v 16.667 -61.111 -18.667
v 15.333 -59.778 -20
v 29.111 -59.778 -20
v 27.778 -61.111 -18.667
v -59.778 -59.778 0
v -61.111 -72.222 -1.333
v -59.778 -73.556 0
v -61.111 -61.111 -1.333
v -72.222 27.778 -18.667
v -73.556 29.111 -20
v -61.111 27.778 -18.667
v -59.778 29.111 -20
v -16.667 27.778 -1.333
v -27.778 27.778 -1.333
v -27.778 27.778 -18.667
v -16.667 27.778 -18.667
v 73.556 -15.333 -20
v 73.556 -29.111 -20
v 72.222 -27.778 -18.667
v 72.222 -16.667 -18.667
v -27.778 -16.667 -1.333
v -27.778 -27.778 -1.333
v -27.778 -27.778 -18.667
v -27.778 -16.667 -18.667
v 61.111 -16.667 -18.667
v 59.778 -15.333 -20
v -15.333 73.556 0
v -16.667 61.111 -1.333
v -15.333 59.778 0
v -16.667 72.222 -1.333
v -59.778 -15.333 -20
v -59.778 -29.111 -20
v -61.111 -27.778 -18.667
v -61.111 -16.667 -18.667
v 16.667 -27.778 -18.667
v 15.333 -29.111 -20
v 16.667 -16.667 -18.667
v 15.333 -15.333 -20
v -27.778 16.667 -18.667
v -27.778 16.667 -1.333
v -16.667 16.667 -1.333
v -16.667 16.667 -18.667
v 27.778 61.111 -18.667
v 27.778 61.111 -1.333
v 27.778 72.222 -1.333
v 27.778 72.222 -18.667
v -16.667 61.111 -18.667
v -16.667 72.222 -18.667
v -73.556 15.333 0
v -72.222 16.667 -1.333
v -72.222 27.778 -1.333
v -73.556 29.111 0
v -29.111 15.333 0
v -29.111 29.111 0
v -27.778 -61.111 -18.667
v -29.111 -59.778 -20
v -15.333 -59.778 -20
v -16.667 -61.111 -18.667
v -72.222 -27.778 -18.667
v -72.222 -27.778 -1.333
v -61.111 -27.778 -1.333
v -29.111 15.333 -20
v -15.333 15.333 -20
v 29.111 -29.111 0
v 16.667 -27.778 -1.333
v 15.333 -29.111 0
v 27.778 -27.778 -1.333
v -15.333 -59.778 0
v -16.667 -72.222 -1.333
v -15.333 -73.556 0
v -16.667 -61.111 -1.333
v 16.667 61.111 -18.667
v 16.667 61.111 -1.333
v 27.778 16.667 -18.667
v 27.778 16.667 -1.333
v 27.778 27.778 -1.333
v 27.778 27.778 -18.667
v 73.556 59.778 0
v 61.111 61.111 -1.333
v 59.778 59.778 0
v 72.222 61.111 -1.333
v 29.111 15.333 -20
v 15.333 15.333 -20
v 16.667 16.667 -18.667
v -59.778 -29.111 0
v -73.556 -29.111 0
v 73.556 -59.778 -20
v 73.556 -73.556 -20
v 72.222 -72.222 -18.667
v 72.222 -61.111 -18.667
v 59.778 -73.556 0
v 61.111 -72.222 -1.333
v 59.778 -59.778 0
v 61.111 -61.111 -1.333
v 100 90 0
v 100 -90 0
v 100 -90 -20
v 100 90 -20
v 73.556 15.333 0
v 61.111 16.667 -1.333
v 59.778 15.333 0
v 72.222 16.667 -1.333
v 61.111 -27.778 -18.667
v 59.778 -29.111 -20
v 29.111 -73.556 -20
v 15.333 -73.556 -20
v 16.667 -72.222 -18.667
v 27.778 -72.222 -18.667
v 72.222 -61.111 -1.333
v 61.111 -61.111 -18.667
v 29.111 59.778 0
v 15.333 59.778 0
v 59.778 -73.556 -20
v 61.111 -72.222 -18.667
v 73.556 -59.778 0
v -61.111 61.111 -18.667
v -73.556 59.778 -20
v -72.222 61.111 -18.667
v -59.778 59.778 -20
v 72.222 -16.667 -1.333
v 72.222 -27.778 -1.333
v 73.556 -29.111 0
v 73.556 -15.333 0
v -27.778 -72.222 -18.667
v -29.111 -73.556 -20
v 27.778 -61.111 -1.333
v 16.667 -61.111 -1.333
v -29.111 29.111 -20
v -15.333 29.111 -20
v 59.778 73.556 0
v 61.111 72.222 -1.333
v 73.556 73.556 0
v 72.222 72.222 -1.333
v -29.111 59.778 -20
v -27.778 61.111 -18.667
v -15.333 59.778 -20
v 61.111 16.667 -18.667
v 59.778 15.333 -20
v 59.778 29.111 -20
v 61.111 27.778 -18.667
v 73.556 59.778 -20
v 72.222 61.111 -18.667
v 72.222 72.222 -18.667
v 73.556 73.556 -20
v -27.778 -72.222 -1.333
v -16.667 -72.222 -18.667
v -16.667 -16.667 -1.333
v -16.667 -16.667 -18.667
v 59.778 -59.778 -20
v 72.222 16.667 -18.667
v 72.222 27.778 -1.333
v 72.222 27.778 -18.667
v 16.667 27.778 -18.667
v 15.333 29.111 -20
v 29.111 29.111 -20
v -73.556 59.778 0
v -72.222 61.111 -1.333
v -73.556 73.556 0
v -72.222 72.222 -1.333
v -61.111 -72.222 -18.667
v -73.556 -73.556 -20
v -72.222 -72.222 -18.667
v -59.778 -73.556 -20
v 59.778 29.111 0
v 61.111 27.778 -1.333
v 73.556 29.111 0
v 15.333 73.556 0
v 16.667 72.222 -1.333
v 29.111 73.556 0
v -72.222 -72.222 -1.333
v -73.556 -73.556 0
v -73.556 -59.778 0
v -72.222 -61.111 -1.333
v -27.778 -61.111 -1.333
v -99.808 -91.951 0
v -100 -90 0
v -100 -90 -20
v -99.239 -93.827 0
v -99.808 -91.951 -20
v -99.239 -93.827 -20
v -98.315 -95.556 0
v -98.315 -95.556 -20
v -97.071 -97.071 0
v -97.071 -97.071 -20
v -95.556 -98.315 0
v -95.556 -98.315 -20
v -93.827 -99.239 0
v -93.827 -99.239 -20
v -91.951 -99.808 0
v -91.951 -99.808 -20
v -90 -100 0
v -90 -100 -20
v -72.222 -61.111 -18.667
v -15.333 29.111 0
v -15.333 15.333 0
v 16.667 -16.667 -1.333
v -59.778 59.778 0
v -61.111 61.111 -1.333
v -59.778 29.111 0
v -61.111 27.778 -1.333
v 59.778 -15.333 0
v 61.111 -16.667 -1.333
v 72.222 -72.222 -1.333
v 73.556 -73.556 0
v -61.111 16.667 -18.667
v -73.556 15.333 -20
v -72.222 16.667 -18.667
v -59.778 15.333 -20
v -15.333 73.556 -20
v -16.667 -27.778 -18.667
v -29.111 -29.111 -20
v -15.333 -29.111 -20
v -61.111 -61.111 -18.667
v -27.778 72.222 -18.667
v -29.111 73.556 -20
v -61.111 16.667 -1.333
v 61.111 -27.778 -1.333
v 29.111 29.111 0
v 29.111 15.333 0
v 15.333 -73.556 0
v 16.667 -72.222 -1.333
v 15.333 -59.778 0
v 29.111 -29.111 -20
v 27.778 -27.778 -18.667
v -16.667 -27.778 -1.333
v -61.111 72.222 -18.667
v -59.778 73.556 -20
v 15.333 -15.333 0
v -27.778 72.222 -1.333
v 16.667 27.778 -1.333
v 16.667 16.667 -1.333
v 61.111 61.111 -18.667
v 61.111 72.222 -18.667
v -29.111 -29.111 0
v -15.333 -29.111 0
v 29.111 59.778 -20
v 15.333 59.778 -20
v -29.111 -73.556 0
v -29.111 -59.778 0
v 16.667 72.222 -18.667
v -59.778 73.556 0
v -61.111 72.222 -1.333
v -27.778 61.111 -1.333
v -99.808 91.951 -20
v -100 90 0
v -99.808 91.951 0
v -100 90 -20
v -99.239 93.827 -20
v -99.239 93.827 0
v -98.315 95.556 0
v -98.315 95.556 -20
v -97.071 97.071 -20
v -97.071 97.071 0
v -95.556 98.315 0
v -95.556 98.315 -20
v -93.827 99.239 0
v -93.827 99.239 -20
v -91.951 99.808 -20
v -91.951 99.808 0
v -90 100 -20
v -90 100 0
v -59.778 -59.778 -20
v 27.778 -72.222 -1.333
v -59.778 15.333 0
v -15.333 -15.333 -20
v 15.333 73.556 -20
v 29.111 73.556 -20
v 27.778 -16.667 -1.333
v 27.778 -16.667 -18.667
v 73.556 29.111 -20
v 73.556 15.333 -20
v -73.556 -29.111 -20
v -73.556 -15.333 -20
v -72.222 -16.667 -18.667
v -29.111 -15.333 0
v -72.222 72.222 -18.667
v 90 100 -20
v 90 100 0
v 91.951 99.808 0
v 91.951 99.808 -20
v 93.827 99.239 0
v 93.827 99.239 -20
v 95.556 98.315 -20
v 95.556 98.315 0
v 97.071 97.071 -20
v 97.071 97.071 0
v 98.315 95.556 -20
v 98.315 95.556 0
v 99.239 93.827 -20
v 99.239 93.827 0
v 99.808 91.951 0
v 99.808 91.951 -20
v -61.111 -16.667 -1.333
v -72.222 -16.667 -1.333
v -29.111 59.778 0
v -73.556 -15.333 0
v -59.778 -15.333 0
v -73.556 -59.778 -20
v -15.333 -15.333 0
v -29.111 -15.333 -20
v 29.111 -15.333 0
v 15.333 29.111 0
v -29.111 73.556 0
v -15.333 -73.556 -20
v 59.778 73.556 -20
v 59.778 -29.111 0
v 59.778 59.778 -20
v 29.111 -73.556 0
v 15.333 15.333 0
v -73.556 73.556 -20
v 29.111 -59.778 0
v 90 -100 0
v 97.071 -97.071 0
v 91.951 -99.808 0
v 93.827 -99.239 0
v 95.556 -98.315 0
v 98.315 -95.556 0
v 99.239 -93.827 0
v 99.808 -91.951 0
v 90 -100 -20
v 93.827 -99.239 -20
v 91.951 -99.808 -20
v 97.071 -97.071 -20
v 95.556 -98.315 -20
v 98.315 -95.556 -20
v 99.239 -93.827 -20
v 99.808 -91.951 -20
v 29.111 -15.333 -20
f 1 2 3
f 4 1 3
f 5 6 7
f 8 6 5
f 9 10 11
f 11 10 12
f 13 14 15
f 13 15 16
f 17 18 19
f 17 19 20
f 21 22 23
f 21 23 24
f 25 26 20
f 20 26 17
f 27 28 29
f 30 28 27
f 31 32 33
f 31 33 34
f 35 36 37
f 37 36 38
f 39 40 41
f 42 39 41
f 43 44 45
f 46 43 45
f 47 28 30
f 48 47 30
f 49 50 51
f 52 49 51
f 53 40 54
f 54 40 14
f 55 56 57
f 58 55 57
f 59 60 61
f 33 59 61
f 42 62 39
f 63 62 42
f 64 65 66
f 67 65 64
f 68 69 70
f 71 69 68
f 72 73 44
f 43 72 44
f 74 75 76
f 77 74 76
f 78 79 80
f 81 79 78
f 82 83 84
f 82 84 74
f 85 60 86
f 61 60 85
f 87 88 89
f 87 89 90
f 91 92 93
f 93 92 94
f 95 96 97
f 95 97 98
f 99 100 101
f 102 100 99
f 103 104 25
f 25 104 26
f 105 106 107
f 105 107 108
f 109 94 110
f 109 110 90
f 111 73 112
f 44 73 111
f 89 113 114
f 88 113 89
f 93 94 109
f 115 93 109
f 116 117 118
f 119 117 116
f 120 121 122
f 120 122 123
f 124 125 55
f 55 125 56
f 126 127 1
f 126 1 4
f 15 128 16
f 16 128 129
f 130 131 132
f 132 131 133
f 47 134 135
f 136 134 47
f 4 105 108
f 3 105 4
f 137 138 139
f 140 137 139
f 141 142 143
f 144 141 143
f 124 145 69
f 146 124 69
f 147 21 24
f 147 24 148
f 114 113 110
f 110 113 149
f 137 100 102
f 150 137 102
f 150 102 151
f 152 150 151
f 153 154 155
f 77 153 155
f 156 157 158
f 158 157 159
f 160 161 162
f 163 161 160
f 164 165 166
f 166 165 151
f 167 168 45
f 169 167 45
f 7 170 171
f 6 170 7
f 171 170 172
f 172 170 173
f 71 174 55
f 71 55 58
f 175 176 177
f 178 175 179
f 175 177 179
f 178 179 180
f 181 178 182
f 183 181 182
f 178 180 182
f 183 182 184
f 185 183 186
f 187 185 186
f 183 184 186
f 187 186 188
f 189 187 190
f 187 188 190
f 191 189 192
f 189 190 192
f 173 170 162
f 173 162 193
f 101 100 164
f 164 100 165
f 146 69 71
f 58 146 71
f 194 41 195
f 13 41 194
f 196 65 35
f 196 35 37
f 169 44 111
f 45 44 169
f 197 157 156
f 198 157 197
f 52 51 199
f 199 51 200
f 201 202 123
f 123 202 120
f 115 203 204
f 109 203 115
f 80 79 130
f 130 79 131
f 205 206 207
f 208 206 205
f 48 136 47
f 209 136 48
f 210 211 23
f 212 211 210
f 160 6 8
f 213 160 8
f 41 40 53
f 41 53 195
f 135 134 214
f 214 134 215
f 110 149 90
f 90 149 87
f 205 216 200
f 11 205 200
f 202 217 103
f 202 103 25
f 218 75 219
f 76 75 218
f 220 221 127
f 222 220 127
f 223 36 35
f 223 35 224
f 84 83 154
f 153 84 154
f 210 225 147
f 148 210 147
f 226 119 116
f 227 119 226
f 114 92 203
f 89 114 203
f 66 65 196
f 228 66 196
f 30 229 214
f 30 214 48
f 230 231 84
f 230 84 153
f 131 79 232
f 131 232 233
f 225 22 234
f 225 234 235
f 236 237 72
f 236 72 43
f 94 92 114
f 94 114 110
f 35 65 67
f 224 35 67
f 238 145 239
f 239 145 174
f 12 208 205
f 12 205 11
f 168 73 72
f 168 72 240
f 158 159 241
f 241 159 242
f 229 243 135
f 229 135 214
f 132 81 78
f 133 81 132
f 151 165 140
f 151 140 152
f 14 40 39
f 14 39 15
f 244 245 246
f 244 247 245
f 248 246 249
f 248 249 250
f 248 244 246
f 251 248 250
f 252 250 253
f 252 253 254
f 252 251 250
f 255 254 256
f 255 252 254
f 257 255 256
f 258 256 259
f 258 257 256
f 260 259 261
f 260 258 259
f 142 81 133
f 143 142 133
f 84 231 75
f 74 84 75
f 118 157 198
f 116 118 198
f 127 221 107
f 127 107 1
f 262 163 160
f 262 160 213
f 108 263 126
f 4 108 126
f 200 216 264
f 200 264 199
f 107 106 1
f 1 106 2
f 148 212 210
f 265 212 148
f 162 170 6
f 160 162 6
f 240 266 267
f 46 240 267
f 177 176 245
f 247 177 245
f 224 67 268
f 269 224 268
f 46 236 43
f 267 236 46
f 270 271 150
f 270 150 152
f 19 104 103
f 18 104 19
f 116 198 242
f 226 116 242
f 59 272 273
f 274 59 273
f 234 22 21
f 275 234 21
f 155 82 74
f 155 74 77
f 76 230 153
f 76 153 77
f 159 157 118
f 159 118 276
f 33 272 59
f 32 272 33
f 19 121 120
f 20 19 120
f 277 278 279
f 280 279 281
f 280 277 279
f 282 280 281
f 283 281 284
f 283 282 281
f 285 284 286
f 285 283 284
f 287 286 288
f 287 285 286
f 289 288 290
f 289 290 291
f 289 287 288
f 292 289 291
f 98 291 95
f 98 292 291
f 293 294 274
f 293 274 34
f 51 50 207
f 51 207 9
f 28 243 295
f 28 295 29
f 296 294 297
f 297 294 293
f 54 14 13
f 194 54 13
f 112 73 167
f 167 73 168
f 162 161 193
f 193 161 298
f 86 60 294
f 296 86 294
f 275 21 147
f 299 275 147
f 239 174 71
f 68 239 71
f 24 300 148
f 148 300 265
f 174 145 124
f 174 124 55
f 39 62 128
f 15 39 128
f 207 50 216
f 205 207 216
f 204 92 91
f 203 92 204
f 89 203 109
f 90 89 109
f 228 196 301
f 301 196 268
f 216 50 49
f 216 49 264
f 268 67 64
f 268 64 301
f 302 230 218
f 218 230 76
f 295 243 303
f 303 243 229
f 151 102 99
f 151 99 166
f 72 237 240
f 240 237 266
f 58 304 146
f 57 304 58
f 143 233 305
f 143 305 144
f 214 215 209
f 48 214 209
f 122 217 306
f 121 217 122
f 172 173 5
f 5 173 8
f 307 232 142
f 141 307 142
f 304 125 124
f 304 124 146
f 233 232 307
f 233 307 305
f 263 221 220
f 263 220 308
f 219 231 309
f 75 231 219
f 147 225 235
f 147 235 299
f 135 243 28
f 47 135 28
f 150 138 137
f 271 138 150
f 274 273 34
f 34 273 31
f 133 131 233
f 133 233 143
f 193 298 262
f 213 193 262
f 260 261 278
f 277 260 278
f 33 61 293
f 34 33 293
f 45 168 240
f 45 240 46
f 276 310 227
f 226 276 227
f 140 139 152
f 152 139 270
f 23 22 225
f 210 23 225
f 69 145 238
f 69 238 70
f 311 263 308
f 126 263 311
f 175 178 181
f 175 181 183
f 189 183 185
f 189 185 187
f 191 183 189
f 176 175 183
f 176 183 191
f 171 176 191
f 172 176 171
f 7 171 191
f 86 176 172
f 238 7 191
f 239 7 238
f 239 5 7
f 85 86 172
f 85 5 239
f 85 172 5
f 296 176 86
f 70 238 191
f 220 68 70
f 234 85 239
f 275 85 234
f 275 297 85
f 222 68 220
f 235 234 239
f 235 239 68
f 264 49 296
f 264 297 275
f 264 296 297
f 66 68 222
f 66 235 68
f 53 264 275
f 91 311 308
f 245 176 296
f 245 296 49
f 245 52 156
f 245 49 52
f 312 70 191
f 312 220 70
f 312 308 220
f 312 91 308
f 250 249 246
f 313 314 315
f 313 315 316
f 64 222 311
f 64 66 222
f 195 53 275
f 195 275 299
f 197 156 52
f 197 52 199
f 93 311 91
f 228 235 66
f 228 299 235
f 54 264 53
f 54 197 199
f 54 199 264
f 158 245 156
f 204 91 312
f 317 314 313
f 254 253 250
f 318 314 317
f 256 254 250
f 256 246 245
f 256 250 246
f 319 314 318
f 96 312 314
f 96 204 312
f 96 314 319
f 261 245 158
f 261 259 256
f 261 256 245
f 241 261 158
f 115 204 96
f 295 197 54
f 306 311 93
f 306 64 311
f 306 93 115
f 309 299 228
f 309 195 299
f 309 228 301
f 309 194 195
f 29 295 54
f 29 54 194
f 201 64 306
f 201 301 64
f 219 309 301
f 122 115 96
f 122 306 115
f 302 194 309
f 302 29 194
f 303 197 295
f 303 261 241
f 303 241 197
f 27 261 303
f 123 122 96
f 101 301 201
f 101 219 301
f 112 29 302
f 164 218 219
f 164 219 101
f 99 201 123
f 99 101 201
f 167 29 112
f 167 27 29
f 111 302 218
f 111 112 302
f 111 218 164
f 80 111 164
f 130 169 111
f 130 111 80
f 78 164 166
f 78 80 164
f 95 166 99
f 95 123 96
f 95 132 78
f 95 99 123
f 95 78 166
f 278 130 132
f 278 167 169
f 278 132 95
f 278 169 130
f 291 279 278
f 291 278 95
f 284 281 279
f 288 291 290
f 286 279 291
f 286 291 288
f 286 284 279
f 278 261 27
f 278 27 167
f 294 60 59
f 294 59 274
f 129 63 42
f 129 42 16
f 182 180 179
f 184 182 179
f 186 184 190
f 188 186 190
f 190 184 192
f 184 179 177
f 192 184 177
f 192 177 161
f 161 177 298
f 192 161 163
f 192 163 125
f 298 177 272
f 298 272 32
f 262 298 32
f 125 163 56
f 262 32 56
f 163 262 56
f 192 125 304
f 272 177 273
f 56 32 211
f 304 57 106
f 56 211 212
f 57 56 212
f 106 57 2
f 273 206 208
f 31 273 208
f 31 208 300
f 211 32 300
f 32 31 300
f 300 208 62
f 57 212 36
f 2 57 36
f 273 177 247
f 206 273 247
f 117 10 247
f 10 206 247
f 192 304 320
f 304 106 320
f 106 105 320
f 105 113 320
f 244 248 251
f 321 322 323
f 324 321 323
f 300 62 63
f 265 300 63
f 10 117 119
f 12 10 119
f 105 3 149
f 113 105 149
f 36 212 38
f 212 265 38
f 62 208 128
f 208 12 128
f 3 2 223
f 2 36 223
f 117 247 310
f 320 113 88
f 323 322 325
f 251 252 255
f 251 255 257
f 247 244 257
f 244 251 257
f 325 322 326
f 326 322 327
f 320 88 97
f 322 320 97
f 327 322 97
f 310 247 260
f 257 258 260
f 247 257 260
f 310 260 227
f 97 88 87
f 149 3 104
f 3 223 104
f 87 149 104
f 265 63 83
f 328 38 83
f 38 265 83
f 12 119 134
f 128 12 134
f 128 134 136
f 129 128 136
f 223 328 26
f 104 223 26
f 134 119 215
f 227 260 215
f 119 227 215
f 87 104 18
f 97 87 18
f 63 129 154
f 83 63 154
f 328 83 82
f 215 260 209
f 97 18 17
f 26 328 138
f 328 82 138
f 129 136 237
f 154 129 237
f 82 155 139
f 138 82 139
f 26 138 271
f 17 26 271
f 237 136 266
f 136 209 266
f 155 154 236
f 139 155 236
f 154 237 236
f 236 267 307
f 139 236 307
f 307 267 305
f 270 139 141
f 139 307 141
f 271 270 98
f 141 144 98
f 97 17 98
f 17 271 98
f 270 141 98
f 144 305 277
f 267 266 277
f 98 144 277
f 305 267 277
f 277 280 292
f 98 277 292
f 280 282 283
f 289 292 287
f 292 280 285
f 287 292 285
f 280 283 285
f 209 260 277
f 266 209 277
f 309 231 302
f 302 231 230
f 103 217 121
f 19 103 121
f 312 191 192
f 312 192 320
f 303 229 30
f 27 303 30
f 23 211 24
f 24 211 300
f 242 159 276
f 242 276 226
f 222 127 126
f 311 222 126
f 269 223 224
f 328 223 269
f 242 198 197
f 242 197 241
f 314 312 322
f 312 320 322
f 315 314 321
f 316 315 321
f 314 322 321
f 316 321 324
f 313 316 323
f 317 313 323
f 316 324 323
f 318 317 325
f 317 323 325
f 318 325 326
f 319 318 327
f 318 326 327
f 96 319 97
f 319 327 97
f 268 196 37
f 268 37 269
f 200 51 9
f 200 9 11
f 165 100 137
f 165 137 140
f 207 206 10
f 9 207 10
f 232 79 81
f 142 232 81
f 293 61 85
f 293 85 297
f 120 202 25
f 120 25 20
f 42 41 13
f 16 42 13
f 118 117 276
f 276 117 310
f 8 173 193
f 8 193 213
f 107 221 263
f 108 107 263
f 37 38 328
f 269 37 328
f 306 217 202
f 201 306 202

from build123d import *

# Parameters (mm, degrees)
SKETCH1_W                  = 200
SKETCH1_H                  = 200
BOSS_EXTRUDE1_DEPTH        = 20
SKETCH1_3_W                = 11.111111111
SKETCH1_3_H                = 11.111111111
CUT_EXTRUDE2_DEPTH         = 143.828568571
CHAMFER1_SIZE              = 1.333333333
LPATTERN1_COUNT            = 4
LPATTERN1_PITCH            = 44.444444444
LPATTERN1_COUNT_DIR2       = 4
LPATTERN1_PITCH_DIR2       = 44.444444444
CHAMFER1_OF_LPATTERN1_SIZE = 1.333333333
FILLET1_R                  = 10


with BuildPart() as part:
    # Sketch1 → Boss-Extrude1 (new body)
    with BuildSketch(Plane.XY):
        Rectangle(SKETCH1_W, SKETCH1_H)
    extrude(amount=-BOSS_EXTRUDE1_DEPTH)

    # Sketch1_3 → Cut-Extrude2 (cut, symmetric)
    with BuildSketch(Plane.XY):
        with Locations((66.666666667, 66.666666667)):
            Rectangle(SKETCH1_3_W, SKETCH1_3_H)
    cut_extrude2 = extrude(amount=CUT_EXTRUDE2_DEPTH, both=True, mode=Mode.SUBTRACT)

    # Chamfer1
    chamfer1_edges = [part.edges().sort_by_distance(p)[0] for p in [
        (61.111111111, 66.666666667, 0),
        (66.666666667, 61.111111111, 0),
        (72.222222222, 66.666666667, 0),
        (66.666666667, 72.222222222, 0),
        (66.666666667, 72.222222222, -20),
        (61.111111111, 66.666666667, -20),
        (72.222222222, 66.666666667, -20),
        (66.666666667, 61.111111111, -20),
    ]]
    chamfer(chamfer1_edges, length=CHAMFER1_SIZE)

    # LPattern1: Cut-Extrude2 4 × 4
    with Locations(*[(-i * LPATTERN1_PITCH, -j * LPATTERN1_PITCH_DIR2, 0) for i in range(LPATTERN1_COUNT) for j in range(LPATTERN1_COUNT_DIR2) if (i, j) != (0, 0)]):
        add(cut_extrude2, mode=Mode.SUBTRACT)

    # Chamfer1 of LPattern1
    chamfer1_of_lpattern1_edges = [part.edges().sort_by_distance(p)[0] for p in [
        (61.111111111, 22.222222222, 0),
        (66.666666667, 16.666666667, 0),
        (72.222222222, 22.222222222, 0),
        (66.666666667, 27.777777778, 0),
        (66.666666667, 27.777777778, -20),
        (61.111111111, 22.222222222, -20),
        (72.222222222, 22.222222222, -20),
        (66.666666667, 16.666666667, -20),
        (61.111111111, -22.222222222, 0),
        (66.666666667, -27.777777778, 0),
        (72.222222222, -22.222222222, 0),
        (66.666666667, -16.666666667, 0),
        (66.666666667, -16.666666667, -20),
        (61.111111111, -22.222222222, -20),
        (72.222222222, -22.222222222, -20),
        (66.666666667, -27.777777778, -20),
        (61.111111111, -66.666666667, 0),
        (66.666666667, -72.222222222, 0),
        (72.222222222, -66.666666667, 0),
        (66.666666667, -61.111111111, 0),
        (66.666666667, -61.111111111, -20),
        (61.111111111, -66.666666667, -20),
        (72.222222222, -66.666666667, -20),
        (66.666666667, -72.222222222, -20),
        (16.666666667, 66.666666667, 0),
        (22.222222222, 61.111111111, 0),
        (27.777777778, 66.666666667, 0),
        (22.222222222, 72.222222222, 0),
        (22.222222222, 72.222222222, -20),
        (16.666666667, 66.666666667, -20),
        (27.777777778, 66.666666667, -20),
        (22.222222222, 61.111111111, -20),
        (16.666666667, 22.222222222, 0),
        (22.222222222, 16.666666667, 0),
        (27.777777778, 22.222222222, 0),
        (22.222222222, 27.777777778, 0),
        (22.222222222, 27.777777778, -20),
        (16.666666667, 22.222222222, -20),
        (27.777777778, 22.222222222, -20),
        (22.222222222, 16.666666667, -20),
        (16.666666667, -22.222222222, 0),
        (22.222222222, -27.777777778, 0),
        (27.777777778, -22.222222222, 0),
        (22.222222222, -16.666666667, 0),
        (22.222222222, -16.666666667, -20),
        (16.666666667, -22.222222222, -20),
        (27.777777778, -22.222222222, -20),
        (22.222222222, -27.777777778, -20),
        (16.666666667, -66.666666667, 0),
        (22.222222222, -72.222222222, 0),
        (27.777777778, -66.666666667, 0),
        (22.222222222, -61.111111111, 0),
        (22.222222222, -61.111111111, -20),
        (16.666666667, -66.666666667, -20),
        (27.777777778, -66.666666667, -20),
        (22.222222222, -72.222222222, -20),
        (-27.777777778, 66.666666667, 0),
        (-22.222222222, 61.111111111, 0),
        (-16.666666667, 66.666666667, 0),
        (-22.222222222, 72.222222222, 0),
        (-22.222222222, 72.222222222, -20),
        (-27.777777778, 66.666666667, -20),
        (-16.666666667, 66.666666667, -20),
        (-22.222222222, 61.111111111, -20),
        (-27.777777778, 22.222222222, 0),
        (-22.222222222, 16.666666667, 0),
        (-16.666666667, 22.222222222, 0),
        (-22.222222222, 27.777777778, 0),
        (-22.222222222, 27.777777778, -20),
        (-27.777777778, 22.222222222, -20),
        (-16.666666667, 22.222222222, -20),
        (-22.222222222, 16.666666667, -20),
        (-27.777777778, -22.222222222, 0),
        (-22.222222222, -27.777777778, 0),
        (-16.666666667, -22.222222222, 0),
        (-22.222222222, -16.666666667, 0),
        (-22.222222222, -16.666666667, -20),
        (-27.777777778, -22.222222222, -20),
        (-16.666666667, -22.222222222, -20),
        (-22.222222222, -27.777777778, -20),
        (-27.777777778, -66.666666667, 0),
        (-22.222222222, -72.222222222, 0),
        (-16.666666667, -66.666666667, 0),
        (-22.222222222, -61.111111111, 0),
        (-22.222222222, -61.111111111, -20),
        (-27.777777778, -66.666666667, -20),
        (-16.666666667, -66.666666667, -20),
        (-22.222222222, -72.222222222, -20),
        (-72.222222222, 66.666666667, 0),
        (-66.666666667, 61.111111111, 0),
        (-61.111111111, 66.666666667, 0),
        (-66.666666667, 72.222222222, 0),
        (-66.666666667, 72.222222222, -20),
        (-72.222222222, 66.666666667, -20),
        (-61.111111111, 66.666666667, -20),
        (-66.666666667, 61.111111111, -20),
        (-72.222222222, 22.222222222, 0),
        (-66.666666667, 16.666666667, 0),
        (-61.111111111, 22.222222222, 0),
        (-66.666666667, 27.777777778, 0),
        (-66.666666667, 27.777777778, -20),
        (-72.222222222, 22.222222222, -20),
        (-61.111111111, 22.222222222, -20),
        (-66.666666667, 16.666666667, -20),
        (-72.222222222, -22.222222222, 0),
        (-66.666666667, -27.777777778, 0),
        (-61.111111111, -22.222222222, 0),
        (-66.666666667, -16.666666667, 0),
        (-66.666666667, -16.666666667, -20),
        (-72.222222222, -22.222222222, -20),
        (-61.111111111, -22.222222222, -20),
        (-66.666666667, -27.777777778, -20),
        (-72.222222222, -66.666666667, 0),
        (-66.666666667, -72.222222222, 0),
        (-61.111111111, -66.666666667, 0),
        (-66.666666667, -61.111111111, 0),
        (-66.666666667, -61.111111111, -20),
        (-72.222222222, -66.666666667, -20),
        (-61.111111111, -66.666666667, -20),
        (-66.666666667, -72.222222222, -20),
    ]]
    chamfer(chamfer1_of_lpattern1_edges, length=CHAMFER1_OF_LPATTERN1_SIZE)

    # Fillet1
    fillet1_edges = [part.edges().sort_by_distance(p)[0] for p in [
        (-100, -100, -10),
        (100, -100, -10),
        (100, 100, -10),
        (-100, 100, -10),
    ]]
    fillet(fillet1_edges, radius=FILLET1_R)


solid = part.part
